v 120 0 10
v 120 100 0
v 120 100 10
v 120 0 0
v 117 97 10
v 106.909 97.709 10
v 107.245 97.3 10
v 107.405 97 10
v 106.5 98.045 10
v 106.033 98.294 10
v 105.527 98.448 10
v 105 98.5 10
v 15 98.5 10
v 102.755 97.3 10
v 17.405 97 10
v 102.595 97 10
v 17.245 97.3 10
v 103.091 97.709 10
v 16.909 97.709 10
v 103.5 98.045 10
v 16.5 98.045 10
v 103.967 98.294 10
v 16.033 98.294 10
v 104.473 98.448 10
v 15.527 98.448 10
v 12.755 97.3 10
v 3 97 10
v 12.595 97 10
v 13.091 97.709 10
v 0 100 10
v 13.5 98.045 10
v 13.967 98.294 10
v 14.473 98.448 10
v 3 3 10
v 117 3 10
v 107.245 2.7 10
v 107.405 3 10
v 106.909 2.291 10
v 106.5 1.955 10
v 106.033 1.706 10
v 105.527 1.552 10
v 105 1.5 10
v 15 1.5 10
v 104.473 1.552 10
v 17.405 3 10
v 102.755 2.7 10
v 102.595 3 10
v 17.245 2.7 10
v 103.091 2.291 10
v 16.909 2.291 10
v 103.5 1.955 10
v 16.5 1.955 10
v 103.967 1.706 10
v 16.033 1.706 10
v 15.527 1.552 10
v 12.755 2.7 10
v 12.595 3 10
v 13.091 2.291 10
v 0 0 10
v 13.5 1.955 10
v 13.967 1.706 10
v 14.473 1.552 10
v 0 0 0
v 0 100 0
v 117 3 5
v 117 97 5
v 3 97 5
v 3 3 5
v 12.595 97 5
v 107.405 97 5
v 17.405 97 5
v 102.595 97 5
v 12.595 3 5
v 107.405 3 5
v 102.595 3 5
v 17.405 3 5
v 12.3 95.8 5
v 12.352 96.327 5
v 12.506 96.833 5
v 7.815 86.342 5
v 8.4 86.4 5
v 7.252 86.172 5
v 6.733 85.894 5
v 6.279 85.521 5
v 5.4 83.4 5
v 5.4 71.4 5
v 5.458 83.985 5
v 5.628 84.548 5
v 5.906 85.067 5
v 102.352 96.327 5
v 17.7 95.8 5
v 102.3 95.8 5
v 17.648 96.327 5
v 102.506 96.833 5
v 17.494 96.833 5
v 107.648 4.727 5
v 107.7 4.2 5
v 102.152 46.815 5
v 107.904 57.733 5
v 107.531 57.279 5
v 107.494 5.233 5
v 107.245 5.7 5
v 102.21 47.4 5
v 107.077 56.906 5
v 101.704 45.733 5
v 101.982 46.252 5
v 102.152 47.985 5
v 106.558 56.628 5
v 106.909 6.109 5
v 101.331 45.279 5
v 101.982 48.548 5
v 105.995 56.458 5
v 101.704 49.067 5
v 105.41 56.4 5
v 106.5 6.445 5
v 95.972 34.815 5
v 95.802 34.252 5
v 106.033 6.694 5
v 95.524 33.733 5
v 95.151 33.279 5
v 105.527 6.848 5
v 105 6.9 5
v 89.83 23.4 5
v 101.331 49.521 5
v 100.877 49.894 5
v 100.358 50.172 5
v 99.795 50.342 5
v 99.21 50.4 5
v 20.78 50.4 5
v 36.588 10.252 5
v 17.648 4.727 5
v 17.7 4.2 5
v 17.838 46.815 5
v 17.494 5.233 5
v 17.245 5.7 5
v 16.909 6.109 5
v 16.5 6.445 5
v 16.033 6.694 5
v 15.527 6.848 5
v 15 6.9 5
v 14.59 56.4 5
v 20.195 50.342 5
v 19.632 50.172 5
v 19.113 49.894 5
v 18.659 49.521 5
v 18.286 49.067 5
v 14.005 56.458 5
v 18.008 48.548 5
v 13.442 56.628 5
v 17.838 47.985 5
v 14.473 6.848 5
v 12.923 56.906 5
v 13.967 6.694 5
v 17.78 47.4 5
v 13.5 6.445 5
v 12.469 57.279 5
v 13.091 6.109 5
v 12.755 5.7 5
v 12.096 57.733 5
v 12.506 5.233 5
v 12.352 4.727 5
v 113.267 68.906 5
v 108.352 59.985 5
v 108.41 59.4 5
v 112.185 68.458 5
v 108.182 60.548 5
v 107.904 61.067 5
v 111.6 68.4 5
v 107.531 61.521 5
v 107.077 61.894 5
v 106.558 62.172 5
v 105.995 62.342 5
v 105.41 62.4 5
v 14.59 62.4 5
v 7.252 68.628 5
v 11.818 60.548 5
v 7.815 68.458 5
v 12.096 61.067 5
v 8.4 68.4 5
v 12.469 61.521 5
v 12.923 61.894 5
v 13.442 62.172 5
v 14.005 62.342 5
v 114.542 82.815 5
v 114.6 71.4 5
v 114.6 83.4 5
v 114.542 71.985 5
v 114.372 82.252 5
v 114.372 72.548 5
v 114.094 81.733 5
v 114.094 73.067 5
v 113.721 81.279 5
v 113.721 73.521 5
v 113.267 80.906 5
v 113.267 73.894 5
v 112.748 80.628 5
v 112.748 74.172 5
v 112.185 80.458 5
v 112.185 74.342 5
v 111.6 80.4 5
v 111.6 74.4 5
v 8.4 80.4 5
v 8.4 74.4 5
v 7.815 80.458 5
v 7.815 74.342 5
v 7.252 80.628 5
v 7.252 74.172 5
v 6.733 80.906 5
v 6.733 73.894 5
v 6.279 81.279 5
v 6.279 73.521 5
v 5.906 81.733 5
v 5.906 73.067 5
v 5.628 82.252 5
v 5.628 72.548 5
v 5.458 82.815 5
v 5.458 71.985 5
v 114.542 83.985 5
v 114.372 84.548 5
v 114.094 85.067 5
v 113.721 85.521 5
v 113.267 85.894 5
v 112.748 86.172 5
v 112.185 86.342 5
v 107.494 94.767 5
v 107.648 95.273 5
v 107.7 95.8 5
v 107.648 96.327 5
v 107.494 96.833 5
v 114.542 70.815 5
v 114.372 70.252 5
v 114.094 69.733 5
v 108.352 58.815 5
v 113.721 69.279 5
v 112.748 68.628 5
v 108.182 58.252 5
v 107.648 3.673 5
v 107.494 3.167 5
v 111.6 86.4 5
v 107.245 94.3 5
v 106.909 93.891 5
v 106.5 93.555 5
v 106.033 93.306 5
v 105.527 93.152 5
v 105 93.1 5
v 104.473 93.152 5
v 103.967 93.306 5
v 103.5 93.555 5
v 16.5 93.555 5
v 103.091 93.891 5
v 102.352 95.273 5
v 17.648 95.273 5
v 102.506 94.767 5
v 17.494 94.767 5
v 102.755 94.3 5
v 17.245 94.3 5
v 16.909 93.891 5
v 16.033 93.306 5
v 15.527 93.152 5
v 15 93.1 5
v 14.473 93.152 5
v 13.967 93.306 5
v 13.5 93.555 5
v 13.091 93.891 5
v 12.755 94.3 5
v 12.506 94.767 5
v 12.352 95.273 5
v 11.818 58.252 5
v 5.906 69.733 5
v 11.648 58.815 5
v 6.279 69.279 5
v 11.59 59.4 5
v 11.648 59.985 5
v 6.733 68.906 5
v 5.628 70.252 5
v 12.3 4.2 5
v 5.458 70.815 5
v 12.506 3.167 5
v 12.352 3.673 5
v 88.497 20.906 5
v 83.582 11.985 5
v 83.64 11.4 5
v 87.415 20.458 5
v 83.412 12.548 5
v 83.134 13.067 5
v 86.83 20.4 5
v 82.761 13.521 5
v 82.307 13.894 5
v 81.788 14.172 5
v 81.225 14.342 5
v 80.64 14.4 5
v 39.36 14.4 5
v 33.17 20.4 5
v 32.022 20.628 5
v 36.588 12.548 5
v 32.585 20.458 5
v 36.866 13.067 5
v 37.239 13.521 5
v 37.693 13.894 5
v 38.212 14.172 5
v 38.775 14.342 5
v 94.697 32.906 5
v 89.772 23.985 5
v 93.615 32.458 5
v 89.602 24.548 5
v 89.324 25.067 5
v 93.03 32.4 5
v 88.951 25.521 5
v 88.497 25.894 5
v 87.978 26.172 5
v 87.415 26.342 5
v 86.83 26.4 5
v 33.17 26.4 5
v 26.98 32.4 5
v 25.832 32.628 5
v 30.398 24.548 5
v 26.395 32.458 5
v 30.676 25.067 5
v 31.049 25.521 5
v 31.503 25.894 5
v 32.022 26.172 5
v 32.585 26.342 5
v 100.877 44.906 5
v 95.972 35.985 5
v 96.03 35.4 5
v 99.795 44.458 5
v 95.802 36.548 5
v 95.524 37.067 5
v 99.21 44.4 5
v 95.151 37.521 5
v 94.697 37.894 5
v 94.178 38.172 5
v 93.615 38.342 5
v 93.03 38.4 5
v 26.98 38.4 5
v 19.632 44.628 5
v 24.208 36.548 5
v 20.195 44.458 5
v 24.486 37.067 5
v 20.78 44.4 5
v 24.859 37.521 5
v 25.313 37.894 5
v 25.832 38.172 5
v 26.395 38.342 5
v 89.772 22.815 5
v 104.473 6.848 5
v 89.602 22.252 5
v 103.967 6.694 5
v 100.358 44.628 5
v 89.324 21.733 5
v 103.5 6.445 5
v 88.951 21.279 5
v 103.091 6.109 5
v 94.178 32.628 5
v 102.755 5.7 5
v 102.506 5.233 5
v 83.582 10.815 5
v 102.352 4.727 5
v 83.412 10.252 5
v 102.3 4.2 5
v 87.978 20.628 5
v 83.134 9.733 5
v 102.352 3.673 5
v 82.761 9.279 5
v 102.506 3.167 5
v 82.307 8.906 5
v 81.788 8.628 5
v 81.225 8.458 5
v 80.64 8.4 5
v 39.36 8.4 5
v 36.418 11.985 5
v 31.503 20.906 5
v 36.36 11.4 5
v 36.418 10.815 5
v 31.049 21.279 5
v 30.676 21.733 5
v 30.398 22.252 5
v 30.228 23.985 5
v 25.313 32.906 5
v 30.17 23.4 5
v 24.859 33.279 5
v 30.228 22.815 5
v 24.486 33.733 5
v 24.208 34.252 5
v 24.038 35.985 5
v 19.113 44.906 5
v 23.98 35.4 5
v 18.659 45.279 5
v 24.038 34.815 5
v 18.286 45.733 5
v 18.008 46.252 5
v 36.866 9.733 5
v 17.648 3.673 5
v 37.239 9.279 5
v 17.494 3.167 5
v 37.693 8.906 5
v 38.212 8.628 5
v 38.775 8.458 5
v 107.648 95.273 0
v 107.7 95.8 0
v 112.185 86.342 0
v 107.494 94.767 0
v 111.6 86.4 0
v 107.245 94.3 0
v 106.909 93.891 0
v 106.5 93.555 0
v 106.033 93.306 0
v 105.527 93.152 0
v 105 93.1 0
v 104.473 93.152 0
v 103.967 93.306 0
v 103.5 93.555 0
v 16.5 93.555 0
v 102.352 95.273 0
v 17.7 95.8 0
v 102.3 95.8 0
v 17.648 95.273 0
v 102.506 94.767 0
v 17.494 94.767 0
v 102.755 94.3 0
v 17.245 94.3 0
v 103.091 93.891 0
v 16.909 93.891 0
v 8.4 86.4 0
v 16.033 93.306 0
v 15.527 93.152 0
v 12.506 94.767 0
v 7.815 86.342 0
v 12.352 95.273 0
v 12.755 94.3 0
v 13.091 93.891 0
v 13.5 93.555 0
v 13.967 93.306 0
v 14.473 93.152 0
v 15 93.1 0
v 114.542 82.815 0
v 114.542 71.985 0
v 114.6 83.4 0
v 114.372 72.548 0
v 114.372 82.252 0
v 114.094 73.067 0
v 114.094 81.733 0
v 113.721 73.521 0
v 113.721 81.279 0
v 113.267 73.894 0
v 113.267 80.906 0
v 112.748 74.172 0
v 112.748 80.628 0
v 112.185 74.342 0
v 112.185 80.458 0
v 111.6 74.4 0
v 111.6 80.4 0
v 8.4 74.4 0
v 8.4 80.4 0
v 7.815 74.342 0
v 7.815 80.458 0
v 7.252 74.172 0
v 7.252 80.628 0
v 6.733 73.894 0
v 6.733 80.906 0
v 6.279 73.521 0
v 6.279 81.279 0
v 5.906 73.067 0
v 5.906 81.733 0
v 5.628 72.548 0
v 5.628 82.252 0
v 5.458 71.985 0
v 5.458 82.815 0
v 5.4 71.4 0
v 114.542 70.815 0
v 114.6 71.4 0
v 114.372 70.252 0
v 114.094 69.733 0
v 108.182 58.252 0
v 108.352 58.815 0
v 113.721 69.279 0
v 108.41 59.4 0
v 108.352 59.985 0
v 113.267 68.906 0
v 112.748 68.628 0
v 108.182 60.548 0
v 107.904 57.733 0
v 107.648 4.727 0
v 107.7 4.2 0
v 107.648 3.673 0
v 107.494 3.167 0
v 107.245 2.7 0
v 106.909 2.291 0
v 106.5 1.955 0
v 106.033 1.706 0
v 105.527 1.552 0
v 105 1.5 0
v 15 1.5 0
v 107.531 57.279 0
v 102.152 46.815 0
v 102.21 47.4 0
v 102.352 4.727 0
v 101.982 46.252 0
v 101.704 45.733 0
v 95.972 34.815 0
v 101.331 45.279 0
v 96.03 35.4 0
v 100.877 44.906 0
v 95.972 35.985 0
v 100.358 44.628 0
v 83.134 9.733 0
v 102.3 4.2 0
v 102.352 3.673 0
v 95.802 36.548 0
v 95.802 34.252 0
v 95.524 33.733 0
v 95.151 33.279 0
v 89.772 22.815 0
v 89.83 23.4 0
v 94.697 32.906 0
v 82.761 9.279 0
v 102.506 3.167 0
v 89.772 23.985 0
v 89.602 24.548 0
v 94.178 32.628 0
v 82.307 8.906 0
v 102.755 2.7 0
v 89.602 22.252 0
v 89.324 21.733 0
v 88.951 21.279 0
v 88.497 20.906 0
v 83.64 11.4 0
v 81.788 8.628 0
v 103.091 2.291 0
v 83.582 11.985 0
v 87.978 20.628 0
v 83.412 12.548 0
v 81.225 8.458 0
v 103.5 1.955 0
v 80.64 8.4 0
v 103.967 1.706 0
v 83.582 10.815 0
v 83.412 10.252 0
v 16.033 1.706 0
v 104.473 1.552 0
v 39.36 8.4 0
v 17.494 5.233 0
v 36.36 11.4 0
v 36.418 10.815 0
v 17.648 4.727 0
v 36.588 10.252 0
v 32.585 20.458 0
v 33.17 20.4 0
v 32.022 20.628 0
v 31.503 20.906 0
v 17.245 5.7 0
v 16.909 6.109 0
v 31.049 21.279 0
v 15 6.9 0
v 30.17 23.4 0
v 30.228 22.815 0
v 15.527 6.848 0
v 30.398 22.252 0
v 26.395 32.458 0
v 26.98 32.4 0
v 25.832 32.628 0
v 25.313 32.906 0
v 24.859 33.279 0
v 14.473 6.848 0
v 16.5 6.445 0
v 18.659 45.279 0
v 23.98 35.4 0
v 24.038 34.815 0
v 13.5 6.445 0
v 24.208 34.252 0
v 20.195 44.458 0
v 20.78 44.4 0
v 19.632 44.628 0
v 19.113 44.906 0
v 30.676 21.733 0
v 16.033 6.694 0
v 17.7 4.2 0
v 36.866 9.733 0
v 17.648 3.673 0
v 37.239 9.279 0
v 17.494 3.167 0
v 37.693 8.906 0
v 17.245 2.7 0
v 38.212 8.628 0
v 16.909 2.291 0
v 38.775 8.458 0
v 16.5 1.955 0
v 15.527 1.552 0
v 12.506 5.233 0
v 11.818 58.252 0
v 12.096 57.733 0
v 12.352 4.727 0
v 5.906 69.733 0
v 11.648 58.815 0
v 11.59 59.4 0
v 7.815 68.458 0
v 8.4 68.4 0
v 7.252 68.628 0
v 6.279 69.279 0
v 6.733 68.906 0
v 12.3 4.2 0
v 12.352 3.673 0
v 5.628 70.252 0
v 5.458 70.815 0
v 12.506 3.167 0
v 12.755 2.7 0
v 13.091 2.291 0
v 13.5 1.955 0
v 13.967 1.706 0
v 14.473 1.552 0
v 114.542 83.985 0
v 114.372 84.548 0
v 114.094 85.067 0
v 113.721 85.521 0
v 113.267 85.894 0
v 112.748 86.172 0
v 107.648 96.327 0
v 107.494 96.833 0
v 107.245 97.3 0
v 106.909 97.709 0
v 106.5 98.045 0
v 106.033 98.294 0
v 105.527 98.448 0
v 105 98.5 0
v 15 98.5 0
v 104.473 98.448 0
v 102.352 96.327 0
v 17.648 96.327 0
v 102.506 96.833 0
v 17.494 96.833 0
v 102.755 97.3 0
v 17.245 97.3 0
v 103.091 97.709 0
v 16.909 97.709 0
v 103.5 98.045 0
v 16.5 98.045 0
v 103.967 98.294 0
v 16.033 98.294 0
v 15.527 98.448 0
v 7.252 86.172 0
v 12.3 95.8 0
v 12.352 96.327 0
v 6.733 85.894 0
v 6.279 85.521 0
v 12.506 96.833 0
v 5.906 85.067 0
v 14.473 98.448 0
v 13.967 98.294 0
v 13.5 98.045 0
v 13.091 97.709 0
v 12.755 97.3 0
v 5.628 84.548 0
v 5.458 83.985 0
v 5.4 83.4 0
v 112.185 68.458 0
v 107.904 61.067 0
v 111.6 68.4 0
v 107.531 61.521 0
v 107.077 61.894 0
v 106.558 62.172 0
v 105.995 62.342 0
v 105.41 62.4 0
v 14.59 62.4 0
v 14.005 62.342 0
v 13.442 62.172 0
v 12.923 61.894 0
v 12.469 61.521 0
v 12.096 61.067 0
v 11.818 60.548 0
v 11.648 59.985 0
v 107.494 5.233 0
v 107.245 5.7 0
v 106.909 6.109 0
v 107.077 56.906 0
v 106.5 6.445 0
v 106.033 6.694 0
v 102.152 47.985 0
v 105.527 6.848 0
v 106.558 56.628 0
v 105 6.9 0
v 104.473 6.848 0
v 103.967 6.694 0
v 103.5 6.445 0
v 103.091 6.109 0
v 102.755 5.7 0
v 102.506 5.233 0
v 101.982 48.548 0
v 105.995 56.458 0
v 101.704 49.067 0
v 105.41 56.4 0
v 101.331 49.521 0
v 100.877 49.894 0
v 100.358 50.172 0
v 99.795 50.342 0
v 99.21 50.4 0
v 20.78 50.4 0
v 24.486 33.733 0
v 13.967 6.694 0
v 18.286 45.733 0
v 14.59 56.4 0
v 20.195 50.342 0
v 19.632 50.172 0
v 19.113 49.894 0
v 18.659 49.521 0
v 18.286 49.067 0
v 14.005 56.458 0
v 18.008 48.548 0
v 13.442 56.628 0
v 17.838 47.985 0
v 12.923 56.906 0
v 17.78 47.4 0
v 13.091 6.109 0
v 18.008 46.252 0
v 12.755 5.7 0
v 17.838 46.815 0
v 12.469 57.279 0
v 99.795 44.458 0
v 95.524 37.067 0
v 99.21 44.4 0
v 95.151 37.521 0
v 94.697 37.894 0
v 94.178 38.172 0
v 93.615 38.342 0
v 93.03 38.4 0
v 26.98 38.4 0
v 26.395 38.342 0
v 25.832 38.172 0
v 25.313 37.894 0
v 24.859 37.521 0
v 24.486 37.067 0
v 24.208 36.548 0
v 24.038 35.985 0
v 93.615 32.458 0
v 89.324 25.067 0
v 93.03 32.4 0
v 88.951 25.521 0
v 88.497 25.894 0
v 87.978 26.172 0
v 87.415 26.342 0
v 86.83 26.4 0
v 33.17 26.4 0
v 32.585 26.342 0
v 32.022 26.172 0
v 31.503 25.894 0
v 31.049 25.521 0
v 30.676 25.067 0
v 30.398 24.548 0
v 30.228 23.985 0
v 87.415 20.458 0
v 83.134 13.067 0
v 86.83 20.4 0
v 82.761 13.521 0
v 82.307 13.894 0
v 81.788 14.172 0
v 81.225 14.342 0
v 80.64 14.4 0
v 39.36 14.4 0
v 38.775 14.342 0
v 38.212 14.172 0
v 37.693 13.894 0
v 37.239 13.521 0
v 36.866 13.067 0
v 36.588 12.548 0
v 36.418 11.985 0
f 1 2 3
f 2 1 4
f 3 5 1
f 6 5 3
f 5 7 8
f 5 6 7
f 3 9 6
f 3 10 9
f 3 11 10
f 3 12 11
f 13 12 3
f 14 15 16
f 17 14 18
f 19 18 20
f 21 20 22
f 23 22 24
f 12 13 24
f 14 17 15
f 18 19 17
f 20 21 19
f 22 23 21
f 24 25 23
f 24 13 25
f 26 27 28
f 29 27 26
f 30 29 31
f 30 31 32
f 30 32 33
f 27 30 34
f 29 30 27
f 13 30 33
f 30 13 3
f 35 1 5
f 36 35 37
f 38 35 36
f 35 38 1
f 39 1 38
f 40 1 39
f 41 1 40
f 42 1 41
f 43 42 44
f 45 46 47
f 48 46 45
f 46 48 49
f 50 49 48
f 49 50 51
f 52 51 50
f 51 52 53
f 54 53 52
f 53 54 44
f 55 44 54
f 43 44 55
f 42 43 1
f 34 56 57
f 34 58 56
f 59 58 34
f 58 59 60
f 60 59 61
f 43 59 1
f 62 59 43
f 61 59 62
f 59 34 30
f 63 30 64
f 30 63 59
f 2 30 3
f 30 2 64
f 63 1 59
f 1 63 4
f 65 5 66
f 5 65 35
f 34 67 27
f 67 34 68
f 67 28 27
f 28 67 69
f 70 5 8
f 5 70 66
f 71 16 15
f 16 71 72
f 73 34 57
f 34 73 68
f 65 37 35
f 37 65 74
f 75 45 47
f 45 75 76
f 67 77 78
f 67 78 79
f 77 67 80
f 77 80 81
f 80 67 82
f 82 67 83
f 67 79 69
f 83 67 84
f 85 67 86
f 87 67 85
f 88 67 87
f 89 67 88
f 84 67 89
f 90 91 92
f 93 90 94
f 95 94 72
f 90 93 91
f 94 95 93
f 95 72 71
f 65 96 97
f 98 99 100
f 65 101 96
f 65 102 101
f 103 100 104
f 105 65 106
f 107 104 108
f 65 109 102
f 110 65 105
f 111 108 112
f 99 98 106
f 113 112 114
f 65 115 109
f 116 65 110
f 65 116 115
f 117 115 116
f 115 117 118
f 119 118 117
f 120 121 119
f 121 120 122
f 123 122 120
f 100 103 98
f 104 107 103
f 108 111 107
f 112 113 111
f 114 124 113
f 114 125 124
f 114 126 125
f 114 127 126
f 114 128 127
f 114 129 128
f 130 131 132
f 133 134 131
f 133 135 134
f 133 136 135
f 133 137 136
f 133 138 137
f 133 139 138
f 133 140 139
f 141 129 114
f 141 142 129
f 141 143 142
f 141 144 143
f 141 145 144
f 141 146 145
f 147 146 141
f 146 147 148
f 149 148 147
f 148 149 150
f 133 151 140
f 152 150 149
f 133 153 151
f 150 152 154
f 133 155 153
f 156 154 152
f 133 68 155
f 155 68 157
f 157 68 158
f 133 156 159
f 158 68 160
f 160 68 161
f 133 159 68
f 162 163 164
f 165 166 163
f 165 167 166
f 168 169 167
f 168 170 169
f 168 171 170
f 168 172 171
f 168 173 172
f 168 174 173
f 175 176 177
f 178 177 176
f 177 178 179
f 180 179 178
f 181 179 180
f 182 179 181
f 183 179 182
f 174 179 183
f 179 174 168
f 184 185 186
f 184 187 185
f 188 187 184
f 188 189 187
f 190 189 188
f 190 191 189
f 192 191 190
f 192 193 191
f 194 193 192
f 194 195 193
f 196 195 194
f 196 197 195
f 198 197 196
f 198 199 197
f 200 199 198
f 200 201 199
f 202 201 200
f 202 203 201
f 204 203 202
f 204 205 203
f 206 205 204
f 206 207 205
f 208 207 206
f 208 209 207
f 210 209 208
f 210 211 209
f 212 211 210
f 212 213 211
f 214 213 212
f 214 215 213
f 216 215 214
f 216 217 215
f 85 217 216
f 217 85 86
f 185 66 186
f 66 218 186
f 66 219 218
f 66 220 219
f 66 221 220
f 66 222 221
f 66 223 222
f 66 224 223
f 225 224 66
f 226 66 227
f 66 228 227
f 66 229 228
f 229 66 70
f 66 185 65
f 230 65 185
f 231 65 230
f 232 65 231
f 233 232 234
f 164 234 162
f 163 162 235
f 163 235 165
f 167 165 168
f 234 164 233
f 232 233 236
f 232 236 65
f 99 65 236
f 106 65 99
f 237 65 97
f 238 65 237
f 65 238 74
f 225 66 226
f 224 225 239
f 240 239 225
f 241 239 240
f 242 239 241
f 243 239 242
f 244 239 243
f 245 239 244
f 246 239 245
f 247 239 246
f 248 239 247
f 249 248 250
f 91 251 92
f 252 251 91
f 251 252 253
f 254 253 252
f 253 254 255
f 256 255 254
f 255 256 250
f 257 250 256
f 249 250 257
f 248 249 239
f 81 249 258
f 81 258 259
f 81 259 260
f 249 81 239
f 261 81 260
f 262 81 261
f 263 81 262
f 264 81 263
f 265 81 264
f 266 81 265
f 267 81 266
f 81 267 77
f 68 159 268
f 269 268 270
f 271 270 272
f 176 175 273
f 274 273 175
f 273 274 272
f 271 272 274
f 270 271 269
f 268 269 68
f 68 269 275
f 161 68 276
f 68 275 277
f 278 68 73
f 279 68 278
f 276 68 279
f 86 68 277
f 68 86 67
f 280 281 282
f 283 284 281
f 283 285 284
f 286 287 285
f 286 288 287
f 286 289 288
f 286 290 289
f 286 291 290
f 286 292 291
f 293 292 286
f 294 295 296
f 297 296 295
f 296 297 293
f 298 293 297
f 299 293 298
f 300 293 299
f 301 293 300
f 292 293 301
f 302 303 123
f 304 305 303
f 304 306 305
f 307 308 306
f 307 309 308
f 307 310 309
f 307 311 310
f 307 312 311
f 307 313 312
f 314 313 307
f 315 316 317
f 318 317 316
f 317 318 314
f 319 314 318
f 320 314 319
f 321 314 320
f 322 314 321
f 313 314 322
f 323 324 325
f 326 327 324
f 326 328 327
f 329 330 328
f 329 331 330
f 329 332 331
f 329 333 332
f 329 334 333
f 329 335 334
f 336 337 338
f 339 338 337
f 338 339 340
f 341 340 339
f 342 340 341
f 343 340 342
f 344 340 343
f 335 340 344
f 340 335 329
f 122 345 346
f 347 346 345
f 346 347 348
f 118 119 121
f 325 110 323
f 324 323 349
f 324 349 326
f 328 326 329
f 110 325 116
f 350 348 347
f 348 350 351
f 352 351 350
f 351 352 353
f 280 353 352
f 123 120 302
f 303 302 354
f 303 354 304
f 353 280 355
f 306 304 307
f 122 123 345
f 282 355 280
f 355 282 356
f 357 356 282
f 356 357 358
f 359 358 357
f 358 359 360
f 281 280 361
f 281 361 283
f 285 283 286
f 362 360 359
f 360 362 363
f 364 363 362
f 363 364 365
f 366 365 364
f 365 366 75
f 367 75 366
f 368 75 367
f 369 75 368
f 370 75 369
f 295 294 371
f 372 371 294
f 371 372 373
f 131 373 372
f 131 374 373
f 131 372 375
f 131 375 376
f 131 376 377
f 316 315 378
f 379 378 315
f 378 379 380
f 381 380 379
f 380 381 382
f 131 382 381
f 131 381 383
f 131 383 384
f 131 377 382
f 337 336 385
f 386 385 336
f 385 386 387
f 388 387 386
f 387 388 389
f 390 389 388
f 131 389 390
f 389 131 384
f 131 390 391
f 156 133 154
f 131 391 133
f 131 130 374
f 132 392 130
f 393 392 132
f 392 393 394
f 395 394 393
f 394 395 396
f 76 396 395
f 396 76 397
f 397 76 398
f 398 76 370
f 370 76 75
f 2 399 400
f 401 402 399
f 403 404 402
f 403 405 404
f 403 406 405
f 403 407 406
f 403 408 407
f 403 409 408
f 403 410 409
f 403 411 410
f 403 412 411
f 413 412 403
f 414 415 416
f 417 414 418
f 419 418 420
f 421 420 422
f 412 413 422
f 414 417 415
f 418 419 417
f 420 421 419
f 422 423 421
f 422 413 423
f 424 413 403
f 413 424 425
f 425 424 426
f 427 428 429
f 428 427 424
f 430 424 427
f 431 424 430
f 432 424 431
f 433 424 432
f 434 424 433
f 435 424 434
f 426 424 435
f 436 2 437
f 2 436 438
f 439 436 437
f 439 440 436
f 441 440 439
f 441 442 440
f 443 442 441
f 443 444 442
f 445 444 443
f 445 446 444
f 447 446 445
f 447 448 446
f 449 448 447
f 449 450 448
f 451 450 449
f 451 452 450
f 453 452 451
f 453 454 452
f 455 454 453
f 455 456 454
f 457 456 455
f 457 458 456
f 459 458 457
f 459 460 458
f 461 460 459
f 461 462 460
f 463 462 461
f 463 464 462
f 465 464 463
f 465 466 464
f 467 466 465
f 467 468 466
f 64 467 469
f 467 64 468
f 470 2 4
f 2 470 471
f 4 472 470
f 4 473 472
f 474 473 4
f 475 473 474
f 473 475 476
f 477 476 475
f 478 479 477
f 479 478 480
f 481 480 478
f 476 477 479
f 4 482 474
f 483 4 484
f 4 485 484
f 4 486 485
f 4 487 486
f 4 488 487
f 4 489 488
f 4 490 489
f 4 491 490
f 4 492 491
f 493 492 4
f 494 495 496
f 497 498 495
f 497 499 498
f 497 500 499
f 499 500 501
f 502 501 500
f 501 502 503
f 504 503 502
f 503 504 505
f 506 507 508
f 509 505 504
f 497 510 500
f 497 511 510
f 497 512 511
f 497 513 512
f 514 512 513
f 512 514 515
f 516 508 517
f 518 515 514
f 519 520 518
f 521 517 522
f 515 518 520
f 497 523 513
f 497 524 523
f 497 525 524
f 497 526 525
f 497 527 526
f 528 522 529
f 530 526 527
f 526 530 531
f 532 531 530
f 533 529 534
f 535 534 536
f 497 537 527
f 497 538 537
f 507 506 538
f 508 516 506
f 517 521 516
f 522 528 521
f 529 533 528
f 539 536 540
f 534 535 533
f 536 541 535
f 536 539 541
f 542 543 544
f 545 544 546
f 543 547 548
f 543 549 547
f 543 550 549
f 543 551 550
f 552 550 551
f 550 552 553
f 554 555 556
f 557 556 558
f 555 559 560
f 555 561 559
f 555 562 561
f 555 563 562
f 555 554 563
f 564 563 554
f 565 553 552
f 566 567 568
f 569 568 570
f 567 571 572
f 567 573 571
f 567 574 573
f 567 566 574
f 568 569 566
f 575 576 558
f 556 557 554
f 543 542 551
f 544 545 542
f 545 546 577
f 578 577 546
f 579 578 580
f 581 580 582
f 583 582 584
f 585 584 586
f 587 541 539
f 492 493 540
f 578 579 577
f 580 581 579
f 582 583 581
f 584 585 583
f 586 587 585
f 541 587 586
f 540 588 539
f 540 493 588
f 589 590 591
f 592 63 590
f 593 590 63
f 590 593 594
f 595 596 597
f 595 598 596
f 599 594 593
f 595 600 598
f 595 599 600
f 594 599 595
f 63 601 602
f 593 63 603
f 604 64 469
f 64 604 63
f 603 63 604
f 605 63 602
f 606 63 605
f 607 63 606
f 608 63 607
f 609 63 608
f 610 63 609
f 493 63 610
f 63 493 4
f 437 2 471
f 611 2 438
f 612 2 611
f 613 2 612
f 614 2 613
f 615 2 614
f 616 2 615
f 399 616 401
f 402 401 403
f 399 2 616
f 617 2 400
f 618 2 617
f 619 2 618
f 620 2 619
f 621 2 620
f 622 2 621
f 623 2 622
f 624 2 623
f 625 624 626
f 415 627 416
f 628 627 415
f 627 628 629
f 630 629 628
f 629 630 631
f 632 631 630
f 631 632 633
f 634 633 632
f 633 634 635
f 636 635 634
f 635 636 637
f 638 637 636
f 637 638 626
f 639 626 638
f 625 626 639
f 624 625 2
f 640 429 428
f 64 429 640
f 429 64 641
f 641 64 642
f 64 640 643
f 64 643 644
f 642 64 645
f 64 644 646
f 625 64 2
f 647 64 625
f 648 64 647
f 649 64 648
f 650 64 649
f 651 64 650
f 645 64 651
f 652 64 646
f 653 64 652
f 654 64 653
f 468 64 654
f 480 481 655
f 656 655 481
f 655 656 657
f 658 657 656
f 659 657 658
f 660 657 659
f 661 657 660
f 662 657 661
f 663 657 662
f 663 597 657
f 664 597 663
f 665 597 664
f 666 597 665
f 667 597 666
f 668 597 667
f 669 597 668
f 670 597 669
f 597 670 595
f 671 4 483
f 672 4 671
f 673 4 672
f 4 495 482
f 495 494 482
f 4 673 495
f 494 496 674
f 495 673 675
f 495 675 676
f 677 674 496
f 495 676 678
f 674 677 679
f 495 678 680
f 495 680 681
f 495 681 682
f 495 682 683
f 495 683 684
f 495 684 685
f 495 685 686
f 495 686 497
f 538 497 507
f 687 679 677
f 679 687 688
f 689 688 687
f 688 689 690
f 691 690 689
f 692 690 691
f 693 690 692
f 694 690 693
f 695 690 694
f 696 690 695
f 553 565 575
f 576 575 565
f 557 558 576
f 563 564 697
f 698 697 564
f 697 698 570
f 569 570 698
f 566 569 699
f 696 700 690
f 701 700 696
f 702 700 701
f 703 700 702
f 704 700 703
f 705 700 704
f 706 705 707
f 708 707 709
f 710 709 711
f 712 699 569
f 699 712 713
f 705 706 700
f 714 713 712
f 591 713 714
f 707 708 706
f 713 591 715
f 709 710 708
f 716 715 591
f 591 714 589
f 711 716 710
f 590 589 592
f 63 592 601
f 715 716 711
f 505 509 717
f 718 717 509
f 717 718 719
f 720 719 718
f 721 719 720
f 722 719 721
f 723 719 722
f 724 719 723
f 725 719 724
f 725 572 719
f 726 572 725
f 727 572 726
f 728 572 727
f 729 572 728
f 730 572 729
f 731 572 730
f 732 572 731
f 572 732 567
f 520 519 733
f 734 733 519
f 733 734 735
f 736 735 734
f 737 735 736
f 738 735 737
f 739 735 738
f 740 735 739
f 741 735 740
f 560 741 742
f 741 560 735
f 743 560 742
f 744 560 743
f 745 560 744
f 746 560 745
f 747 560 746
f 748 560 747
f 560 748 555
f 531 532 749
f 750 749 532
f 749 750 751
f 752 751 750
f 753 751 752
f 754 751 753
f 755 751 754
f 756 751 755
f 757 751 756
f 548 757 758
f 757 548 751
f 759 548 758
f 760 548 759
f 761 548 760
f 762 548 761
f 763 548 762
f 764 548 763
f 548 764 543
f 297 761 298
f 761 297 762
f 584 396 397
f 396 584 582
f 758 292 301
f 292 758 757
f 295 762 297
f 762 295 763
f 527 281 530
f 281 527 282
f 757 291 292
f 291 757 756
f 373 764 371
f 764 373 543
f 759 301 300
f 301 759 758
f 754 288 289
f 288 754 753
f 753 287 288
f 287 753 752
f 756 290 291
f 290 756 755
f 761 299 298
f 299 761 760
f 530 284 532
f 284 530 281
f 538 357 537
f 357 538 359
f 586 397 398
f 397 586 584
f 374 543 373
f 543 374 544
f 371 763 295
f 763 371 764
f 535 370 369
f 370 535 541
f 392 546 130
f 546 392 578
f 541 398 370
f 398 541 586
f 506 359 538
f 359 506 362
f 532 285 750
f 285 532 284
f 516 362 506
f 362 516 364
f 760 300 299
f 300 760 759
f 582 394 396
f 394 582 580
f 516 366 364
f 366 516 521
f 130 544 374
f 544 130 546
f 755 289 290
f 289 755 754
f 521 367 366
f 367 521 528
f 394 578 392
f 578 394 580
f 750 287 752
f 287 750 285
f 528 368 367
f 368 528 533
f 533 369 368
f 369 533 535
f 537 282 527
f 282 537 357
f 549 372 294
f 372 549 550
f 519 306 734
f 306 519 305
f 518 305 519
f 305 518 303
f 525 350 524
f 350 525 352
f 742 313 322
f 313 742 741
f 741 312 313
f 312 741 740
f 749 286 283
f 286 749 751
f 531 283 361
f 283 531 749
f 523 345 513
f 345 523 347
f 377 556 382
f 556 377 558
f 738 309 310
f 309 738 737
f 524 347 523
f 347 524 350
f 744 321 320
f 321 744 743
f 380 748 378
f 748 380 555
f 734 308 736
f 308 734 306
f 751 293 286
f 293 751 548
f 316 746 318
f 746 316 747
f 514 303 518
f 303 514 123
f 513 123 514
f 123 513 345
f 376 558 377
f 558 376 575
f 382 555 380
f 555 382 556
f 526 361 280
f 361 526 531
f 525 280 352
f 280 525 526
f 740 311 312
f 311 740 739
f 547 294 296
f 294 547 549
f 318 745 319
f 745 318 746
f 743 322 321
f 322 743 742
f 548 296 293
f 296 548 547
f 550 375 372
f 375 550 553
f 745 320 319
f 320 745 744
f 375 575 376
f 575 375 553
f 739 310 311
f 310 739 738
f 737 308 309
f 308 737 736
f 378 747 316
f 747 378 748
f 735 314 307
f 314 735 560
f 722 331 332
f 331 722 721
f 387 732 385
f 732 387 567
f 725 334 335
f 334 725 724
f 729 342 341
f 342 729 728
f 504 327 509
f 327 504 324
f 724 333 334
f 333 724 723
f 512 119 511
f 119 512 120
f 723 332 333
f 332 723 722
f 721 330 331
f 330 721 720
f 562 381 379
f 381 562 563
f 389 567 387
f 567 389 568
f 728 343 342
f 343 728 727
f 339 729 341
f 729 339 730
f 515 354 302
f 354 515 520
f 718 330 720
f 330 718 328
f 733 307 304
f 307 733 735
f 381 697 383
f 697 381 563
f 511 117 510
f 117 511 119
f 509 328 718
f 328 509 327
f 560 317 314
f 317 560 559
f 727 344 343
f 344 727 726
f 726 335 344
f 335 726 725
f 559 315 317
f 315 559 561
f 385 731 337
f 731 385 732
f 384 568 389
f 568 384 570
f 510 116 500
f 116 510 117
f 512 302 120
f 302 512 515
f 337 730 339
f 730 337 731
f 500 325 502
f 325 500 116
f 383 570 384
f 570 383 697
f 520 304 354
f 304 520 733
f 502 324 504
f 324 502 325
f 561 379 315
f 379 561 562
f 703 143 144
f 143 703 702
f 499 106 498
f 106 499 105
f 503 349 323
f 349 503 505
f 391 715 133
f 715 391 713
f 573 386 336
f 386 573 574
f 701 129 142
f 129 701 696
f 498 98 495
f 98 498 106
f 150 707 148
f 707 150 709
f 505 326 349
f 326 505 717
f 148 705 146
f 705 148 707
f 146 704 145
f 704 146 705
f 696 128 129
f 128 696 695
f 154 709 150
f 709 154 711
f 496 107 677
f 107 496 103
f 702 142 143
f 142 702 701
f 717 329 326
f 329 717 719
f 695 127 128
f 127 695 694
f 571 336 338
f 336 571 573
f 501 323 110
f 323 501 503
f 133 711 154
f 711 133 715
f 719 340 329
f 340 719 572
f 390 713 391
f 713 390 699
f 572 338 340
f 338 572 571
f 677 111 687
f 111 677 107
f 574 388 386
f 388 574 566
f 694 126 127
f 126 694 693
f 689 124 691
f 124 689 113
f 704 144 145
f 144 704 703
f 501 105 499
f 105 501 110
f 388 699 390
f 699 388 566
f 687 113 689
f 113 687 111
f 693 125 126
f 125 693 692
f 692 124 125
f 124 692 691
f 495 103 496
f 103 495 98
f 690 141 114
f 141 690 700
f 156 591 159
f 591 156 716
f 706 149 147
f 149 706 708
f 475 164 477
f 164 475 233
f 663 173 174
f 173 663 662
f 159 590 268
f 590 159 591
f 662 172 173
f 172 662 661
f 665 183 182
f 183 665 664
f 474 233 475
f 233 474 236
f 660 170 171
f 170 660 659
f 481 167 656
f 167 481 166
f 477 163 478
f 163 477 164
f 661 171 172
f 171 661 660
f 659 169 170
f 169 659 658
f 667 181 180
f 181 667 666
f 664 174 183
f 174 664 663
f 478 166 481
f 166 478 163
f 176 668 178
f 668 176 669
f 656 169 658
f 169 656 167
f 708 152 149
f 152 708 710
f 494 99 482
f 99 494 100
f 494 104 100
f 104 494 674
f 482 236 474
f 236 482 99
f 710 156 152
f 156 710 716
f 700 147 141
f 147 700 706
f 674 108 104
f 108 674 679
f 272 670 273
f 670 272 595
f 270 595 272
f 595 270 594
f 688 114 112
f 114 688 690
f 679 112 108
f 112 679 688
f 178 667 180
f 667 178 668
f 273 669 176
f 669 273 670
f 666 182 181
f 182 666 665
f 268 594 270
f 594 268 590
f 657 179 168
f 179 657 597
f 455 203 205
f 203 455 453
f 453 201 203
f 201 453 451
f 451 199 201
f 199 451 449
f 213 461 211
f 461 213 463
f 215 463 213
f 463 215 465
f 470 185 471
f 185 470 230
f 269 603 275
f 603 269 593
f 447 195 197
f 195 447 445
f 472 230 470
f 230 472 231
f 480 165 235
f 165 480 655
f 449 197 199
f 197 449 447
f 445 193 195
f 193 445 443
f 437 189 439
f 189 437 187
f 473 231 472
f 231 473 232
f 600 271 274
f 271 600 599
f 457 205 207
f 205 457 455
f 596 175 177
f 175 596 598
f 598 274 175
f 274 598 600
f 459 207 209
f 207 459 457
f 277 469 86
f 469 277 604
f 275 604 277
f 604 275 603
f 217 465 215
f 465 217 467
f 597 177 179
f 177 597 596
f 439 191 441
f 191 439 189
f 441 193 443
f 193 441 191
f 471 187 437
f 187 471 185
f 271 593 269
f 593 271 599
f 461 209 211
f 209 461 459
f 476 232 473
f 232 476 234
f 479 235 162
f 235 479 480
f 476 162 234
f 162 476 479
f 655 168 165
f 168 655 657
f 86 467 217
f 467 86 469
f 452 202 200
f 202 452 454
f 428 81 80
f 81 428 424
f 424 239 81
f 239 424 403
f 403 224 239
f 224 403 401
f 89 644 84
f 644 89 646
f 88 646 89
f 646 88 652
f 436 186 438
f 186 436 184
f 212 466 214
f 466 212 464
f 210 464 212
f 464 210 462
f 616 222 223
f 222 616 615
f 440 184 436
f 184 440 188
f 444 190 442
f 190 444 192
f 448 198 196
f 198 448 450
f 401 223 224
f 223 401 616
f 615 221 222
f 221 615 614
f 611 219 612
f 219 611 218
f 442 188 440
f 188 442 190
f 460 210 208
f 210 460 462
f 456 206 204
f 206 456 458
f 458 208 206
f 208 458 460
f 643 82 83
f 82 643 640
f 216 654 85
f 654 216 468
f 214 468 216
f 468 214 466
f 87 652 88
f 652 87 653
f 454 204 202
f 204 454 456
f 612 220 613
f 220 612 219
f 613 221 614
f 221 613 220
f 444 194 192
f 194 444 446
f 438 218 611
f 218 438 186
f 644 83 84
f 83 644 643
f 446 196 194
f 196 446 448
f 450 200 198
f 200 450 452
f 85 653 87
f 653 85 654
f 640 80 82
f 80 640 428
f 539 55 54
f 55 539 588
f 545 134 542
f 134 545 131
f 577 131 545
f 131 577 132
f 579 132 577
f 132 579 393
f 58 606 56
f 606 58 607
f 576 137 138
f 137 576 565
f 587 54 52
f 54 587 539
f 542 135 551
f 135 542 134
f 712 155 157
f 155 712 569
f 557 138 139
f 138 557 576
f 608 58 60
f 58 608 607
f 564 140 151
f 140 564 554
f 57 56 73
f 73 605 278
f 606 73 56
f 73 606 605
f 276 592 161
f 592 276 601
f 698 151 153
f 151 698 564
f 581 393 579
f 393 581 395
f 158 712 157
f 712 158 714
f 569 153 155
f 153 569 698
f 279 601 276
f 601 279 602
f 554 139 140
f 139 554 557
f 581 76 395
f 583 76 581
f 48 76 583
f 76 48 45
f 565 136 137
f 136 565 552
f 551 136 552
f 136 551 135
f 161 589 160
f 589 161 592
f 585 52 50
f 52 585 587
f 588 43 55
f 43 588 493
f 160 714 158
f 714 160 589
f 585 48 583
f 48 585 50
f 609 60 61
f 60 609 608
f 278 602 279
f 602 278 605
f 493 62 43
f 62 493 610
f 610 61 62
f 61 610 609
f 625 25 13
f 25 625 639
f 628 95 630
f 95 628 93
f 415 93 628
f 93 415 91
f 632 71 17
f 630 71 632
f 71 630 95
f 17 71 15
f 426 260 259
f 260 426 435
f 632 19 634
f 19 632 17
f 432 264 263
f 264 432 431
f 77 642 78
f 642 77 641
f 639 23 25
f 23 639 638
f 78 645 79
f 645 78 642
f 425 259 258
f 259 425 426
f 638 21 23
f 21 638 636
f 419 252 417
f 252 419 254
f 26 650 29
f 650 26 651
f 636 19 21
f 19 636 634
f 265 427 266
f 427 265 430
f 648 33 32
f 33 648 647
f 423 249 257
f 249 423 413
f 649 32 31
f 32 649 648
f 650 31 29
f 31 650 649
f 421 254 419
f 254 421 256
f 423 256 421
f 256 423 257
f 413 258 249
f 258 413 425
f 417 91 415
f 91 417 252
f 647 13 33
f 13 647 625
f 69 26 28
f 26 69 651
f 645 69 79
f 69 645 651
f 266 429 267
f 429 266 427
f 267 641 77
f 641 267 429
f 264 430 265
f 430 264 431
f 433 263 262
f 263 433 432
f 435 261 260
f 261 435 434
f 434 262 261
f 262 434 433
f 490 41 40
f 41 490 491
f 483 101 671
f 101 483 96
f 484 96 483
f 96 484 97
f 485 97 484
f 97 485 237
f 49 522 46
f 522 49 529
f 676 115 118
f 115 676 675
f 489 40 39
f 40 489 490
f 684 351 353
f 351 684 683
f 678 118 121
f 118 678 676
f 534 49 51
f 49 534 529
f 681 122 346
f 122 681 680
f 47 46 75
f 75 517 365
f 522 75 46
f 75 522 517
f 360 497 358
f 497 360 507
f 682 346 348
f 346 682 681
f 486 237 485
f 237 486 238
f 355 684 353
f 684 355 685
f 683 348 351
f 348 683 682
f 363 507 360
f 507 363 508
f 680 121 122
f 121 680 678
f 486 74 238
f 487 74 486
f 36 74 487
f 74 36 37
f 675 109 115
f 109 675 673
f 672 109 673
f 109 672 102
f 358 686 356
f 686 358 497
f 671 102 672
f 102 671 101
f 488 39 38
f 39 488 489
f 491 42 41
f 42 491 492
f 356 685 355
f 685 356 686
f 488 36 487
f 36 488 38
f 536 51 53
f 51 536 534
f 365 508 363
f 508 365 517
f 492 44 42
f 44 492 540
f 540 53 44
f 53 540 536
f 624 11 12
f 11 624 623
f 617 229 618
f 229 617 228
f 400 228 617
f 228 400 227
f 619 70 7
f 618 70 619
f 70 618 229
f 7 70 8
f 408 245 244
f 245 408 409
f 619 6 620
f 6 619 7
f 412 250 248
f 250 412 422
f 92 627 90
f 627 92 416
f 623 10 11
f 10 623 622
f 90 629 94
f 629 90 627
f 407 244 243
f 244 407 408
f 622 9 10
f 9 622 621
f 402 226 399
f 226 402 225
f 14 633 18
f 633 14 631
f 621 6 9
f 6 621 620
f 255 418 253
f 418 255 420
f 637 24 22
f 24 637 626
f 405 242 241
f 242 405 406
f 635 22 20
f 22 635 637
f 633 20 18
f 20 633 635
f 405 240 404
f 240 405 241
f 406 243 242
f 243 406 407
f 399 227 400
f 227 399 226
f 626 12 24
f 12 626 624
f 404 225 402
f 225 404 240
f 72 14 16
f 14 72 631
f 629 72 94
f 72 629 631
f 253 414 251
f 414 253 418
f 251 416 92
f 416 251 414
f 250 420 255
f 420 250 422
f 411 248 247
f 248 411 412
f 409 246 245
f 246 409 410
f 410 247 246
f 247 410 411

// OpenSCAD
$fn = 32;

// ----------------------------------------------------------------------
// Slotted panel: 120 x 100 mm, 7 рядов of slots
// ----------------------------------------------------------------------

// --- parameters (mm) ---
panel_w = 120;            // panel width
panel_d = 100;            // panel depth
thick = 5;                // panel thickness
slot_w = 6;               // slot width
pitch0 = 12;              // first row pitch
pitch_step = 2.4;         // pitch increase per row
margin = 8.4;             // margin around the slot field
rows = 7;                 // number of slot rows
mount_d = 5.4;            // mounting holes
mount_x = 45;             // mounting hole offset
rim_h = 10;               // rim height
rim_t = 3;                // rim wall thickness

difference() {
  union() {
    cube([panel_w, panel_d, thick]);
    translate([0, 0, thick - 1]) difference() {
      cube([panel_w, panel_d, rim_h - thick + 1]);
      translate([rim_t, rim_t, -2.5]) cube([panel_w - 2 * rim_t, panel_d - 2 * rim_t, rim_h - thick + 6]);
    }
  }
  /* slot rows: stadium shaped cutters, 2.5 mm clear of both faces */
  /* row 0: pitch 12, length 41.28 */
  hull() {
    translate([39.36, 11.4, -2.5]) cylinder(h = thick + 5, d = slot_w);
    translate([80.64, 11.4, -2.5]) cylinder(h = thick + 5, d = slot_w);
  }
  /* row 1: pitch 12, length 53.66 */
  hull() {
    translate([33.17, 23.4, -2.5]) cylinder(h = thick + 5, d = slot_w);
    translate([86.83, 23.4, -2.5]) cylinder(h = thick + 5, d = slot_w);
  }
  /* row 2: pitch 12, length 66.05 */
  hull() {
    translate([26.98, 35.4, -2.5]) cylinder(h = thick + 5, d = slot_w);
    translate([93.03, 35.4, -2.5]) cylinder(h = thick + 5, d = slot_w);
  }
  /* row 3: pitch 12, length 78.43 */
  hull() {
    translate([20.78, 47.4, -2.5]) cylinder(h = thick + 5, d = slot_w);
    translate([99.21, 47.4, -2.5]) cylinder(h = thick + 5, d = slot_w);
  }
  /* row 4: pitch 12, length 90.82 */
  hull() {
    translate([14.59, 59.4, -2.5]) cylinder(h = thick + 5, d = slot_w);
    translate([105.41, 59.4, -2.5]) cylinder(h = thick + 5, d = slot_w);
  }
  /* row 5: pitch 12, length 103.2 */
  hull() {
    translate([8.4, 71.4, -2.5]) cylinder(h = thick + 5, d = slot_w);
    translate([111.6, 71.4, -2.5]) cylinder(h = thick + 5, d = slot_w);
  }
  /* row 6: pitch 12, length 103.2 */
  hull() {
    translate([8.4, 83.4, -2.5]) cylinder(h = thick + 5, d = slot_w);
    translate([111.6, 83.4, -2.5]) cylinder(h = thick + 5, d = slot_w);
  }
  translate([15, 4.2, -2.5]) cylinder(h = 15, d = mount_d);
  translate([15, 95.8, -2.5]) cylinder(h = 15, d = mount_d);
  translate([105, 4.2, -2.5]) cylinder(h = 15, d = mount_d);
  translate([105, 95.8, -2.5]) cylinder(h = 15, d = mount_d);
}
